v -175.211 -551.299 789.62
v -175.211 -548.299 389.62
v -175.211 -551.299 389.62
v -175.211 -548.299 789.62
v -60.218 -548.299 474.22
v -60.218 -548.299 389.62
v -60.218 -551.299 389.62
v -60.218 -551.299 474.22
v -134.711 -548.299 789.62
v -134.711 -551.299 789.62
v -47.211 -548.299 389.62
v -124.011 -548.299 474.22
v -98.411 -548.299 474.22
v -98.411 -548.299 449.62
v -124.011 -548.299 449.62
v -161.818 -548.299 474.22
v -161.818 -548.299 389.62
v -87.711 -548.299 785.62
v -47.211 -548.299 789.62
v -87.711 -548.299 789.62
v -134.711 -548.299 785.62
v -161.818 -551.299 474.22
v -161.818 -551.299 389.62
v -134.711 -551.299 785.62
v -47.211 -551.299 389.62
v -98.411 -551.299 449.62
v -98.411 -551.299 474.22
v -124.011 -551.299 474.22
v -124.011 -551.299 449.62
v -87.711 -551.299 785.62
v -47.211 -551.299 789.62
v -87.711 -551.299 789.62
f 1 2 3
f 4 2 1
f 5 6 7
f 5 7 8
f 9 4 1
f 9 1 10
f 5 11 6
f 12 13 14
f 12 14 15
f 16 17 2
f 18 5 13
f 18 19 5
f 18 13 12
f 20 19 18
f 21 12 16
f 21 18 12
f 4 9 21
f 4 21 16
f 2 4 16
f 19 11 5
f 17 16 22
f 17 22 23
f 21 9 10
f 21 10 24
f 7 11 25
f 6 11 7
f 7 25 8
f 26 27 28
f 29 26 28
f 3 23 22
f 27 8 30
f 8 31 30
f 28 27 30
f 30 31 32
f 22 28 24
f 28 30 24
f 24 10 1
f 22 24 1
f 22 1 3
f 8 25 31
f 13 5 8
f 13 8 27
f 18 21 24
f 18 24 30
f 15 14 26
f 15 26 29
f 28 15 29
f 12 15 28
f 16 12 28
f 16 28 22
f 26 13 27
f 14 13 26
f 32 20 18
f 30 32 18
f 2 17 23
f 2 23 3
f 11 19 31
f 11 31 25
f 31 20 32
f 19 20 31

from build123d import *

# Parameters (mm, degrees)
BOSS_EXTRUDE1_DEPTH = 3
SKETCH2_W           = 47
SKETCH2_H           = 8
CUT_EXTRUDE1_DEPTH  = 10


with BuildPart() as part:
    # Sketch1 → Boss-Extrude1 (new body)
    with BuildSketch(Plane.XZ.offset(548.298939869)):
        Polygon((-175.210843614, 789.620141885), (-47.210843614, 789.620141885), (-47.210843614, 389.620141885), (-60.218241118, 389.620141885), (-60.218241118, 474.220141885), (-98.410843614, 474.220141885), (-98.410843614, 449.620141885), (-124.010843614, 449.620141885), (-124.010843614, 474.220141885), (-161.818241118, 474.220141885), (-161.818241118, 389.620141885), (-175.210843614, 389.620141885), align=None)
    extrude(amount=BOSS_EXTRUDE1_DEPTH)

    # Sketch2 → Cut-Extrude1 (cut)
    with BuildSketch(Plane(origin=(0, -548.298939869, 0), x_dir=(1, 0, 0), z_dir=(0, 1, 0))):
        with Locations((-111.210843614, -789.620141885)):
            Rectangle(SKETCH2_W, SKETCH2_H)
    extrude(amount=-CUT_EXTRUDE1_DEPTH, mode=Mode.SUBTRACT)


solid = part.part
